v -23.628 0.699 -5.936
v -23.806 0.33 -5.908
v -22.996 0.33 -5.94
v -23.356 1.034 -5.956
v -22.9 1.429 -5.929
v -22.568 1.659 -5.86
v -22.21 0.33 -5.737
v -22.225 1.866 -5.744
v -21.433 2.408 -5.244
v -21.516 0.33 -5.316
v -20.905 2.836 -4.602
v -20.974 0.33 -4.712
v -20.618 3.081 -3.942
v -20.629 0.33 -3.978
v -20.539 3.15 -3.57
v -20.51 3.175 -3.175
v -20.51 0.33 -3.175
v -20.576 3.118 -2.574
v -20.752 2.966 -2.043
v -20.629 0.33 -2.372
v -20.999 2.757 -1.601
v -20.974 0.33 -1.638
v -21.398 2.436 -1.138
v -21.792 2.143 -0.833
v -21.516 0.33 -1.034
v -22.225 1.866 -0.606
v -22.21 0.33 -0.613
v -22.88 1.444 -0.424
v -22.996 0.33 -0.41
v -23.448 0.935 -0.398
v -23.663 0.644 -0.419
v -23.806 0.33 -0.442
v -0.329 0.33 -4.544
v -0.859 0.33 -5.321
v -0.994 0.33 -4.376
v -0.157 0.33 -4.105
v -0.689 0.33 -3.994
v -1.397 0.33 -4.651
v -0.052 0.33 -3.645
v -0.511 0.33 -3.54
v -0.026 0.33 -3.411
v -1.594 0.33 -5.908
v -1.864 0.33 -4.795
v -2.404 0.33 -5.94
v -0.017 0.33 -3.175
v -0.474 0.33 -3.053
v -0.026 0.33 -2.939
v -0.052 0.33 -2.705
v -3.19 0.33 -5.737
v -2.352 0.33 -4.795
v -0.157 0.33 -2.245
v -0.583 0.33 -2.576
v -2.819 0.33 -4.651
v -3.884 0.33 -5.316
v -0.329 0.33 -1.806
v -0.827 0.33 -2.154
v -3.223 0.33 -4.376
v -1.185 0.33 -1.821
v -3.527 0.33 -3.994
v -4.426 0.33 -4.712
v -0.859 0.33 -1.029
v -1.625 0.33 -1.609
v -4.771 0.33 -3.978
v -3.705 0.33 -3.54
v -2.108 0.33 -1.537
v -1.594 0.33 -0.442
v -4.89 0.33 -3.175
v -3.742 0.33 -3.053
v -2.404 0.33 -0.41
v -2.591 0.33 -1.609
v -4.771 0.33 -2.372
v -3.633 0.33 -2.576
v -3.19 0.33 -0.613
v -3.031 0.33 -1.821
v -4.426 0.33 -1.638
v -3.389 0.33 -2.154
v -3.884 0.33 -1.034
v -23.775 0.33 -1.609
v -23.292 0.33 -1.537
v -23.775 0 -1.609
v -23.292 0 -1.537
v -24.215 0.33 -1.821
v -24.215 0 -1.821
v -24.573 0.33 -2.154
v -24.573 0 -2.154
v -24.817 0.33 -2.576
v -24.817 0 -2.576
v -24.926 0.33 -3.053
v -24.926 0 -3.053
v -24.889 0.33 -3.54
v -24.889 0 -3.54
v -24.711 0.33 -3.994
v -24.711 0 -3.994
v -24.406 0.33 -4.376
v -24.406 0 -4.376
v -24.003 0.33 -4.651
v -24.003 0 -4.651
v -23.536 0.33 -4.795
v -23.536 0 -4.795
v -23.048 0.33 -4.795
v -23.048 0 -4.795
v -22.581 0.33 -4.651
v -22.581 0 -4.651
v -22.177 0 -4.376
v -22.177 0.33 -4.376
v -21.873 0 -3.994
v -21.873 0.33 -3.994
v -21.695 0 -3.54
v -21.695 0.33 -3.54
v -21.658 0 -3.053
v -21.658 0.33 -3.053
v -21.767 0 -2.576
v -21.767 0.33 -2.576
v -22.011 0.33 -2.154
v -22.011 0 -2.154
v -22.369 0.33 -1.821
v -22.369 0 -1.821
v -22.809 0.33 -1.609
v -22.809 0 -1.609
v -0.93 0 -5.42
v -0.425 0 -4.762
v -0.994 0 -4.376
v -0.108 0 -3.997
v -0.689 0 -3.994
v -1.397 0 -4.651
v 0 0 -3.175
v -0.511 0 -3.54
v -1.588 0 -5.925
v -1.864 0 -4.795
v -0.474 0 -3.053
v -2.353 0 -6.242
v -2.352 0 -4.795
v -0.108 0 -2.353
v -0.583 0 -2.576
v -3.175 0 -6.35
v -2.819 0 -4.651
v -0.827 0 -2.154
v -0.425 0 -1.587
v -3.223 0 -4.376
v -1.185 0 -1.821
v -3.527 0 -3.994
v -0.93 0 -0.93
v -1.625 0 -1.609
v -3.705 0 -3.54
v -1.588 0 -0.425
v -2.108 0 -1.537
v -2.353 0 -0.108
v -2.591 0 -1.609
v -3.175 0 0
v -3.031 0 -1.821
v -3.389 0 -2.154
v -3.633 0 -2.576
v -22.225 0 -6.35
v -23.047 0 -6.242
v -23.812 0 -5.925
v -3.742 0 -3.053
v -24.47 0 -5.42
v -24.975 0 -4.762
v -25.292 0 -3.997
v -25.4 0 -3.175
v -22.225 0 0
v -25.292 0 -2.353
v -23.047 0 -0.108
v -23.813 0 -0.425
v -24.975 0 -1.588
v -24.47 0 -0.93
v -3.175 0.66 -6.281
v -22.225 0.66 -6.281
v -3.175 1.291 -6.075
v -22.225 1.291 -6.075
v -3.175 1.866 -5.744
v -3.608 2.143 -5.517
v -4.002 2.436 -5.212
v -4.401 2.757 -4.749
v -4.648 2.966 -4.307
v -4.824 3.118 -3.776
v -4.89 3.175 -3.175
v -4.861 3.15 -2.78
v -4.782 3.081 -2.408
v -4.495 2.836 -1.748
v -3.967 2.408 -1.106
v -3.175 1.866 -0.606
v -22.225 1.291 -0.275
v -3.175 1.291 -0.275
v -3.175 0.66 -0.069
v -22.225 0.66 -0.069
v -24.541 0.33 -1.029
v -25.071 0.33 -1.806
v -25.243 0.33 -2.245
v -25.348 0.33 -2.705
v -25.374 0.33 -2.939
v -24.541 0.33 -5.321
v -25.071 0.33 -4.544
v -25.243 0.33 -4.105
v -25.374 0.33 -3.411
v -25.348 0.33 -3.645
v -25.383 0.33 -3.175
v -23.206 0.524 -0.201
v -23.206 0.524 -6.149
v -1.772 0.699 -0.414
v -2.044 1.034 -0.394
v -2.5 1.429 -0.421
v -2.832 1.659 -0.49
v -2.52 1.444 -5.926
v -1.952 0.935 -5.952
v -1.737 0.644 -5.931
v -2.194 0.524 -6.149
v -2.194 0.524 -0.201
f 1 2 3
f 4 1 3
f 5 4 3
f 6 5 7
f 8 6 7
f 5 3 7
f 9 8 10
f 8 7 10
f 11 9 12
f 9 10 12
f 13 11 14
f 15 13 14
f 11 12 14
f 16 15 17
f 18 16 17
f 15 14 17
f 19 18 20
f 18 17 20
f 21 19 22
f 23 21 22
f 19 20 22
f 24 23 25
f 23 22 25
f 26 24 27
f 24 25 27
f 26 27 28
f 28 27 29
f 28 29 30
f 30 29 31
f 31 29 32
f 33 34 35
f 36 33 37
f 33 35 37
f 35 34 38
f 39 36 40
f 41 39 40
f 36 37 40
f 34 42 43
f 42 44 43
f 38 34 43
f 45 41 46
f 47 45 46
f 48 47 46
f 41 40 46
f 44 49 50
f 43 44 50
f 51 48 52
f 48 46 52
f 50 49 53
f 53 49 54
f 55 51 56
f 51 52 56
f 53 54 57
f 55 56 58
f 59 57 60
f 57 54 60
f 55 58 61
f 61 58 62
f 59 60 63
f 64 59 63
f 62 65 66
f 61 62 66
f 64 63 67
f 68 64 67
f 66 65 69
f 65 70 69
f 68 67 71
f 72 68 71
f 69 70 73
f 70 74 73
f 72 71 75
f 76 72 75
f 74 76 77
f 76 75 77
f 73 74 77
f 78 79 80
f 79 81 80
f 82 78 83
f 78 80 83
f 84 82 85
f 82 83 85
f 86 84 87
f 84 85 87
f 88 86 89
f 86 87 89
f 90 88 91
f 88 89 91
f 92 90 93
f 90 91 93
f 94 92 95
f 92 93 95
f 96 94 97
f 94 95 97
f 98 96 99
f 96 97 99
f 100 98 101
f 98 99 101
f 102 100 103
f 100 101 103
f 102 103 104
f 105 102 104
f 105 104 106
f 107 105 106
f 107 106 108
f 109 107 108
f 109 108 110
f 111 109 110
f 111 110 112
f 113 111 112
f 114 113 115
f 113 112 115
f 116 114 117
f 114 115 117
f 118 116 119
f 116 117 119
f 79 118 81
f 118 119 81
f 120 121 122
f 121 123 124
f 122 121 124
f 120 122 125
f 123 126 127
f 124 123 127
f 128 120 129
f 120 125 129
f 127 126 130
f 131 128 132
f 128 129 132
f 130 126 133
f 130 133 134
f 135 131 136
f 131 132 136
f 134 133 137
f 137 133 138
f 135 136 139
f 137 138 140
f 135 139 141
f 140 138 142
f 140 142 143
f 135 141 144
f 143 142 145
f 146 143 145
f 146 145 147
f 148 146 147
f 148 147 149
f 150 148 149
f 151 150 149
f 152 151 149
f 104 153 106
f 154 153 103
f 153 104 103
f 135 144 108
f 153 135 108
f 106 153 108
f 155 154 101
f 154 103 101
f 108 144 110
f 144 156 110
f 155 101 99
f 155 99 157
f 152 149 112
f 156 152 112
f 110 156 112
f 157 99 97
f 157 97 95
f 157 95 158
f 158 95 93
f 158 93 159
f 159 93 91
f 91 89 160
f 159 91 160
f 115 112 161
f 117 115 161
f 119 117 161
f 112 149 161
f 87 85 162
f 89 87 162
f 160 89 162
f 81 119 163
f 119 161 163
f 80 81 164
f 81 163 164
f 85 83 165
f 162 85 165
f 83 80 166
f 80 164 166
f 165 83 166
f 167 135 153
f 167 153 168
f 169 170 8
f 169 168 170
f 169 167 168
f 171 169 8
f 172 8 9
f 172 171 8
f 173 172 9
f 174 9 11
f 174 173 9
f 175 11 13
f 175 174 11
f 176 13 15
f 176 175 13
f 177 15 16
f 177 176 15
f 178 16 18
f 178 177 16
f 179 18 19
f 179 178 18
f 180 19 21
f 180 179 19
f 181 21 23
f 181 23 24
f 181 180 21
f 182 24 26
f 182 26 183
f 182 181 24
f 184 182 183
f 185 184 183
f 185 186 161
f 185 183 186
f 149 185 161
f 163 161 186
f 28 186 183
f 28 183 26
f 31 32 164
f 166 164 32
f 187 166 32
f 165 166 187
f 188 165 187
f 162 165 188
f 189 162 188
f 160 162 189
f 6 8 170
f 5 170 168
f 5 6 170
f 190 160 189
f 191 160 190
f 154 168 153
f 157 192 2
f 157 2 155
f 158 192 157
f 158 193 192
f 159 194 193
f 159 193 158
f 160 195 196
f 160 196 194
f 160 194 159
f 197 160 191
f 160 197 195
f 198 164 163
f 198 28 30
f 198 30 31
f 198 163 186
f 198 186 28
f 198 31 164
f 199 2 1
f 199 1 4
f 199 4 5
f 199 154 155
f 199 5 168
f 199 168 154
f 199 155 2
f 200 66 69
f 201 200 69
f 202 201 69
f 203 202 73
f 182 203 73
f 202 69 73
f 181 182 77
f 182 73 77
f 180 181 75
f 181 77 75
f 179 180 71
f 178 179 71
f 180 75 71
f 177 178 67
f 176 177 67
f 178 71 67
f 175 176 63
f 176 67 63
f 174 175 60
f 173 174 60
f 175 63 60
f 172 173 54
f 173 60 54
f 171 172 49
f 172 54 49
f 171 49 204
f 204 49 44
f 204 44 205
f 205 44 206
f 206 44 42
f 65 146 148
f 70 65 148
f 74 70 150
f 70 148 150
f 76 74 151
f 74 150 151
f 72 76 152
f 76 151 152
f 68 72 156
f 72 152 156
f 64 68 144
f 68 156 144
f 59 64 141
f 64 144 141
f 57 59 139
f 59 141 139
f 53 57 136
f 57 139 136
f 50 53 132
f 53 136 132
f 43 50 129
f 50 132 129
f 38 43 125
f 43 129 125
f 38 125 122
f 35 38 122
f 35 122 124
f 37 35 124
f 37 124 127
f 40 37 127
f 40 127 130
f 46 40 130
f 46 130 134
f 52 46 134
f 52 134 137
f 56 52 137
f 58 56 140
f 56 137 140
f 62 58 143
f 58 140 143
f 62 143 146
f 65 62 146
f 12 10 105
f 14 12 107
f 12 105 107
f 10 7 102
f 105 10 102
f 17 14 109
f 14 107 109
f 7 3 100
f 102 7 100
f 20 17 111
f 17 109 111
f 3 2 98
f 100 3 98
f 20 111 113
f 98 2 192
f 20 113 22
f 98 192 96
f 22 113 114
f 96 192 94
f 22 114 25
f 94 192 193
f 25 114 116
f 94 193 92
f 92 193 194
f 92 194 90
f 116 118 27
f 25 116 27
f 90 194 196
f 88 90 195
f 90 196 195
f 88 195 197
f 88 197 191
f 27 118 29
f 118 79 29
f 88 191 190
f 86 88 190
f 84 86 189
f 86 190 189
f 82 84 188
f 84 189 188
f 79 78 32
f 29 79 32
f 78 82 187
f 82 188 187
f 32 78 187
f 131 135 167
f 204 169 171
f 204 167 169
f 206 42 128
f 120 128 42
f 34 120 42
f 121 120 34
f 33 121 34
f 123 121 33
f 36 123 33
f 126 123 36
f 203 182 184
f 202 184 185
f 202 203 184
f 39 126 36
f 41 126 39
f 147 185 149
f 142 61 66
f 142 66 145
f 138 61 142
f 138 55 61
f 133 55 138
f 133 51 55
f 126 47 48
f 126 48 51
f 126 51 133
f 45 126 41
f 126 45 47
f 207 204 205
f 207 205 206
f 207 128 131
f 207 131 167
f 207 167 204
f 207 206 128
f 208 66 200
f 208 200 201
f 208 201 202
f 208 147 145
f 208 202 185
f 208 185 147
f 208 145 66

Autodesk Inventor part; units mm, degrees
ref_plane "YZ Plane" through (0, 0, 0) normal (1, 0, 0) x (0, 1, 0)
ref_plane "XZ Plane" through (0, 0, 0) normal (0, 1, 0) x (-1, 0, 0)
ref_plane "XY Plane" through (0, 0, 0) normal (0, 0, 1) x (1, 0, 0)
sketch "Sketch1" plane through (0, 0, 0) normal (0, 1, 0) x (-1, 0, 0)
  line L0 (0, 0) -> (25.4, 0)
  line L1 (25.4, 0) -> (25.4, -6.35)
  line L2 (25.4, -6.35) -> (0, -6.35)
  line L3 (0, -6.35) -> (0, 0)
  dimension "d0" = 25.4
  dimension "d1" = 6.35
extrude "Extrusion1" add sketch "Sketch1" along normal blind 3.175
sketch "Sketch2" plane through (0, 3.175, 0) normal (0, 1, 0) x (1, 0, 0)
  line L0 (0, 0) -> (0, 6.35) projected
  line L1 (0, 3.175) -> (-2.1082, 3.175)
  line L2 (-25.4, 6.35) -> (-25.4, 0) projected
  line L3 (-25.4, 3.175) -> (-23.2918, 3.175)
  dimension "d4" = 2.1082
  dimension "d5" = 2.1082
hole "Hole1" at (-23.2918, 3.175, -3.175) at (-2.1082, 3.175, -3.175) direction (0, -1, 0) diameter 3.2766 depth 5.6896 counterbore diameter 5.5626 counterbore depth 2.8448 clearance for "Socket Head Cap Screw" size "#4" standard "Ansi Unified Screw Threads"
fillet "Fillet1" radius 3.175 6 edges at (-12.7, 3.175, 0) (-12.7, 3.175, -6.35) (-25.4, 3.175, -5.6696) (-25.4, 3.175, -0.6804) (0, 3.175, -5.6696) (0, 3.175, -0.6804)
fillet "Fillet2" radius 3.175 4 edges at (0, 1.4698, -5.9893) (0, 1.4698, -0.3607) (-25.4, 1.4698, -5.9893) (-25.4, 1.4698, -0.3607)
properties part number "Retention Clip - Whisper Valve Horizontal"
